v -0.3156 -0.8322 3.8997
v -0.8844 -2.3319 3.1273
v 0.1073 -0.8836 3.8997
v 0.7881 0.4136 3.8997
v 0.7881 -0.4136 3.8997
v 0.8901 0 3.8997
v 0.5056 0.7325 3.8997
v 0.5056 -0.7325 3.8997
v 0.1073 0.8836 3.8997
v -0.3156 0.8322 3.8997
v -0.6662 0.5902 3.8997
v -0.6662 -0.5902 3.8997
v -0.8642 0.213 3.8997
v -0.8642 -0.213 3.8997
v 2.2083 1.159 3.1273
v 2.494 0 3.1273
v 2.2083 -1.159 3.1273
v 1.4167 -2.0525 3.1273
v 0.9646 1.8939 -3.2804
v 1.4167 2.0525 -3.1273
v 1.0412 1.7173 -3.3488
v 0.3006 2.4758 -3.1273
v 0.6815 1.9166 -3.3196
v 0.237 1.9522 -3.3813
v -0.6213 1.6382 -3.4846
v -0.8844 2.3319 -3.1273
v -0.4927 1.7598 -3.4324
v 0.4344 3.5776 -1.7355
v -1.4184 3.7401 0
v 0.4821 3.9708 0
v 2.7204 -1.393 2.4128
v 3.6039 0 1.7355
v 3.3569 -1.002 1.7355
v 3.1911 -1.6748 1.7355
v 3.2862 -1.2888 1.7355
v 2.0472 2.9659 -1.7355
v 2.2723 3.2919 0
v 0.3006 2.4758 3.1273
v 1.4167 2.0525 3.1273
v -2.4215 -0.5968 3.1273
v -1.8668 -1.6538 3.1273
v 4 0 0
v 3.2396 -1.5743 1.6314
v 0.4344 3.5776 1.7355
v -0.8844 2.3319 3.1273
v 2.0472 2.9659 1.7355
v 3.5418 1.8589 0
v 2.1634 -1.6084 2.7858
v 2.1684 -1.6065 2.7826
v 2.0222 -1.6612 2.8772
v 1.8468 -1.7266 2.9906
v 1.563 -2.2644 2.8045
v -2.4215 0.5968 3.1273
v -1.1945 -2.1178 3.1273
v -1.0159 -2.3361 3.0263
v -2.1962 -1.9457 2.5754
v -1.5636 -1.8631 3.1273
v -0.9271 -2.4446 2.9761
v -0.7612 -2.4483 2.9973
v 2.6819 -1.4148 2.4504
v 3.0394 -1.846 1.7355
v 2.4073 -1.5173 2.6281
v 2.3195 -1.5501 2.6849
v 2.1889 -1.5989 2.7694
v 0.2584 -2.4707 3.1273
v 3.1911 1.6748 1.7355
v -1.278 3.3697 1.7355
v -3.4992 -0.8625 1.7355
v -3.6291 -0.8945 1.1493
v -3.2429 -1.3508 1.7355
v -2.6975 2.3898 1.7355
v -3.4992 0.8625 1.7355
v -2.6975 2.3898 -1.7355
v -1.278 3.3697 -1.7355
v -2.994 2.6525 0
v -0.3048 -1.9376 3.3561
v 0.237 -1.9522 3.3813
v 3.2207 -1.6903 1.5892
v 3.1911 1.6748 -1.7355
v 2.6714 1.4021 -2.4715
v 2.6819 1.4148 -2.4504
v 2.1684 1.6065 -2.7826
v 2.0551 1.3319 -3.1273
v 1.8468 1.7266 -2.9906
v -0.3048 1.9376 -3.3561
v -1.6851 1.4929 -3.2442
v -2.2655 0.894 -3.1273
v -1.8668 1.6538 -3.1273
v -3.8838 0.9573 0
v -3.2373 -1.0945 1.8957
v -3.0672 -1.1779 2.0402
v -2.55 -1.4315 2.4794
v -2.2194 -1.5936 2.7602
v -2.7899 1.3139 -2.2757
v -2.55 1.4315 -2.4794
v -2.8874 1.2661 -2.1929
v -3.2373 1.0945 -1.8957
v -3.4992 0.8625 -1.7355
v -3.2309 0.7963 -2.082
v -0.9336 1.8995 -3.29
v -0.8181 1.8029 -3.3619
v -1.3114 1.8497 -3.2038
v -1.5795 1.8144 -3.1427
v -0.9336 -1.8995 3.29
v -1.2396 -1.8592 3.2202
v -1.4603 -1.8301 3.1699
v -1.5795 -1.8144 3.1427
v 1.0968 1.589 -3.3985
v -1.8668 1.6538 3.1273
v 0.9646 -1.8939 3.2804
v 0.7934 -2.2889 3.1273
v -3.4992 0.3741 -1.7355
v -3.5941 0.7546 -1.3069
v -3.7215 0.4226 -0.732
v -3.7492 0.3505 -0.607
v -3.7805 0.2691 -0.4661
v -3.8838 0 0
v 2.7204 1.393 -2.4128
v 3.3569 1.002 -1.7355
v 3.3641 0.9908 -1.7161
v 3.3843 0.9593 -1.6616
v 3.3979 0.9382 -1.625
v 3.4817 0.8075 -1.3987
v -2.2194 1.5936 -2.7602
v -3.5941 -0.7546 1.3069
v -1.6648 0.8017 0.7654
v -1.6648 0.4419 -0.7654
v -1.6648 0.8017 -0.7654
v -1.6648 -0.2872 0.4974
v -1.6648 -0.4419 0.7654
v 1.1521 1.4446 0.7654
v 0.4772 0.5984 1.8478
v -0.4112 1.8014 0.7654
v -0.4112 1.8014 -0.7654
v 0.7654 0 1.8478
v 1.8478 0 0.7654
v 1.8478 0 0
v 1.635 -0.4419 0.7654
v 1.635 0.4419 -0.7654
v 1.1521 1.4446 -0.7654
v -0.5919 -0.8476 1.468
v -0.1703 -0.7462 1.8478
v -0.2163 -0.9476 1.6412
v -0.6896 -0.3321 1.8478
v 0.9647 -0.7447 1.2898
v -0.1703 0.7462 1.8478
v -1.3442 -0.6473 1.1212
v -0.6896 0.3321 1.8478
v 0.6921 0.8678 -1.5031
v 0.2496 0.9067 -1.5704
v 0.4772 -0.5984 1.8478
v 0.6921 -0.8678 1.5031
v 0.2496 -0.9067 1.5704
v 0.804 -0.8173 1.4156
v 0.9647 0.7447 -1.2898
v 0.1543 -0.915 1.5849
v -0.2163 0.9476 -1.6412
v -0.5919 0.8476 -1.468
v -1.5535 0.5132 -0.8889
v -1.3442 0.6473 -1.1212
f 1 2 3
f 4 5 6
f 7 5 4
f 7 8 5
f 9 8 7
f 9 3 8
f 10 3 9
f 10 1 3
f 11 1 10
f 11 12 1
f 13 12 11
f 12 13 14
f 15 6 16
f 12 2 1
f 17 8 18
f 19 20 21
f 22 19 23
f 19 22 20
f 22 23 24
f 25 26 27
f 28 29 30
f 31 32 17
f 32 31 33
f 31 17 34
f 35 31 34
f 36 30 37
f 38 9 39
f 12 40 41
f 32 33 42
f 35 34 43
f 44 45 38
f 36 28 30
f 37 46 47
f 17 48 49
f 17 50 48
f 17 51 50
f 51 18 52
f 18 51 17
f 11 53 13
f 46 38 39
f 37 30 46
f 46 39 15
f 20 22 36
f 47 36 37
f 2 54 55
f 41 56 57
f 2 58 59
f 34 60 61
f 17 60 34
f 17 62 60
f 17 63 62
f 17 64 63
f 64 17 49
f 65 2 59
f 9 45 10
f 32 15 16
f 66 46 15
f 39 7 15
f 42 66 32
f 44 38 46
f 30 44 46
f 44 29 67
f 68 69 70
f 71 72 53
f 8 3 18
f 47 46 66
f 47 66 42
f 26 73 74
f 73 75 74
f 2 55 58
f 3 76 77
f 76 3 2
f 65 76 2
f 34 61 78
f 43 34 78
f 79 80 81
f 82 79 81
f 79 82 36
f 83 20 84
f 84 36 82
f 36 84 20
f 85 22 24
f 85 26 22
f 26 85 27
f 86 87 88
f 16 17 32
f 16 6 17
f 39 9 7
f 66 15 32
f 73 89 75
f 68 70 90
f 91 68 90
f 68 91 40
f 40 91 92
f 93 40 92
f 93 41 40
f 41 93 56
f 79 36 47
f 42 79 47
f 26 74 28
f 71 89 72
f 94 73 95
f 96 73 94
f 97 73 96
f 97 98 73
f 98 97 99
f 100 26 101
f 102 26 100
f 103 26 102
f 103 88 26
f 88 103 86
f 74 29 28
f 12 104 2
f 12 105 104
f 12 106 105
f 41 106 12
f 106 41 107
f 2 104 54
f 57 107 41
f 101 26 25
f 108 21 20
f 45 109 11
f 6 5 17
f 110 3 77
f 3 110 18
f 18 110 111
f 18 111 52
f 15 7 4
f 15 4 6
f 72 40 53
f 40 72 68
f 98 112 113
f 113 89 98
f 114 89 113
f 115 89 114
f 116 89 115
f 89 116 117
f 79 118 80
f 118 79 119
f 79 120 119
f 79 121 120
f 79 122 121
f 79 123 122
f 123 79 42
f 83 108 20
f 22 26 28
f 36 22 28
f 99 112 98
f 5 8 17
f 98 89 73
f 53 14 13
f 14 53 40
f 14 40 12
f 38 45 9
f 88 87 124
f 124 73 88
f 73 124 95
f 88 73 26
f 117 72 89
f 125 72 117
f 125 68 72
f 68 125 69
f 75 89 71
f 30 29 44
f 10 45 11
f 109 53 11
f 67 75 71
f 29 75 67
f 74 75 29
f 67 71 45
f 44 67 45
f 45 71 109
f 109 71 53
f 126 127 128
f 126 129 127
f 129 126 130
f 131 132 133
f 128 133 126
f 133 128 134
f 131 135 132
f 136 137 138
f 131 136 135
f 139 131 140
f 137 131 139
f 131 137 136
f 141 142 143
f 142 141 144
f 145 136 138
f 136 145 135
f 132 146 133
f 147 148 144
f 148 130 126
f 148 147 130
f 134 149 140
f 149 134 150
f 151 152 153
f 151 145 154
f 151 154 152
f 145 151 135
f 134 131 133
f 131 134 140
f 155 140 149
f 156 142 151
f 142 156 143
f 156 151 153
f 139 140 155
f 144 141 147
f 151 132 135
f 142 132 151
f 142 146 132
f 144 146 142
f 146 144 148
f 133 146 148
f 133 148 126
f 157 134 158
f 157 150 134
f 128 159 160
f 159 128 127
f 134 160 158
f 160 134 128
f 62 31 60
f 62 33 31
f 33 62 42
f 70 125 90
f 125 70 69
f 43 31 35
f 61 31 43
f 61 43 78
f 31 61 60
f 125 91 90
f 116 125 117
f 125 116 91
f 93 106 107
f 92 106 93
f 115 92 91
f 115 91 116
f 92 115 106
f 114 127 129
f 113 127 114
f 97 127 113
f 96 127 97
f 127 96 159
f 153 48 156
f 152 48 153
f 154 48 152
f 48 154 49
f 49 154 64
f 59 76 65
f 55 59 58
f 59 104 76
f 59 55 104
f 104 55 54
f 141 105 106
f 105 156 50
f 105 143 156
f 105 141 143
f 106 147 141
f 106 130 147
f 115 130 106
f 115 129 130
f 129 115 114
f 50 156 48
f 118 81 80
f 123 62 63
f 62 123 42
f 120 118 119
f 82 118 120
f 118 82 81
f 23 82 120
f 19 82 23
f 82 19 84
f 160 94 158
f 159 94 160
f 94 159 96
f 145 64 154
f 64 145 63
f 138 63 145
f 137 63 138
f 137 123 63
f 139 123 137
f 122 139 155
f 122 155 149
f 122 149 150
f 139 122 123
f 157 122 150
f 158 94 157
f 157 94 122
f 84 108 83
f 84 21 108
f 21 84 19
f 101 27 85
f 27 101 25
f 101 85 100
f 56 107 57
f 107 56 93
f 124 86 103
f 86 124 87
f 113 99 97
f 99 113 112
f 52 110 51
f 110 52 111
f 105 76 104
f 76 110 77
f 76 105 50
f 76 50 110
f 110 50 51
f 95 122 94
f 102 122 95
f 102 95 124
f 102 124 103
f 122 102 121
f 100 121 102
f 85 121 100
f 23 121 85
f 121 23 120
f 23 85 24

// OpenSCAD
// Generated by generate_scads.py
difference() {
  sphere(r=4);
  sphere(r=2);
  rotate([120,0,0]) {
    cylinder(h=30, r=4, center=false);
  }
}
